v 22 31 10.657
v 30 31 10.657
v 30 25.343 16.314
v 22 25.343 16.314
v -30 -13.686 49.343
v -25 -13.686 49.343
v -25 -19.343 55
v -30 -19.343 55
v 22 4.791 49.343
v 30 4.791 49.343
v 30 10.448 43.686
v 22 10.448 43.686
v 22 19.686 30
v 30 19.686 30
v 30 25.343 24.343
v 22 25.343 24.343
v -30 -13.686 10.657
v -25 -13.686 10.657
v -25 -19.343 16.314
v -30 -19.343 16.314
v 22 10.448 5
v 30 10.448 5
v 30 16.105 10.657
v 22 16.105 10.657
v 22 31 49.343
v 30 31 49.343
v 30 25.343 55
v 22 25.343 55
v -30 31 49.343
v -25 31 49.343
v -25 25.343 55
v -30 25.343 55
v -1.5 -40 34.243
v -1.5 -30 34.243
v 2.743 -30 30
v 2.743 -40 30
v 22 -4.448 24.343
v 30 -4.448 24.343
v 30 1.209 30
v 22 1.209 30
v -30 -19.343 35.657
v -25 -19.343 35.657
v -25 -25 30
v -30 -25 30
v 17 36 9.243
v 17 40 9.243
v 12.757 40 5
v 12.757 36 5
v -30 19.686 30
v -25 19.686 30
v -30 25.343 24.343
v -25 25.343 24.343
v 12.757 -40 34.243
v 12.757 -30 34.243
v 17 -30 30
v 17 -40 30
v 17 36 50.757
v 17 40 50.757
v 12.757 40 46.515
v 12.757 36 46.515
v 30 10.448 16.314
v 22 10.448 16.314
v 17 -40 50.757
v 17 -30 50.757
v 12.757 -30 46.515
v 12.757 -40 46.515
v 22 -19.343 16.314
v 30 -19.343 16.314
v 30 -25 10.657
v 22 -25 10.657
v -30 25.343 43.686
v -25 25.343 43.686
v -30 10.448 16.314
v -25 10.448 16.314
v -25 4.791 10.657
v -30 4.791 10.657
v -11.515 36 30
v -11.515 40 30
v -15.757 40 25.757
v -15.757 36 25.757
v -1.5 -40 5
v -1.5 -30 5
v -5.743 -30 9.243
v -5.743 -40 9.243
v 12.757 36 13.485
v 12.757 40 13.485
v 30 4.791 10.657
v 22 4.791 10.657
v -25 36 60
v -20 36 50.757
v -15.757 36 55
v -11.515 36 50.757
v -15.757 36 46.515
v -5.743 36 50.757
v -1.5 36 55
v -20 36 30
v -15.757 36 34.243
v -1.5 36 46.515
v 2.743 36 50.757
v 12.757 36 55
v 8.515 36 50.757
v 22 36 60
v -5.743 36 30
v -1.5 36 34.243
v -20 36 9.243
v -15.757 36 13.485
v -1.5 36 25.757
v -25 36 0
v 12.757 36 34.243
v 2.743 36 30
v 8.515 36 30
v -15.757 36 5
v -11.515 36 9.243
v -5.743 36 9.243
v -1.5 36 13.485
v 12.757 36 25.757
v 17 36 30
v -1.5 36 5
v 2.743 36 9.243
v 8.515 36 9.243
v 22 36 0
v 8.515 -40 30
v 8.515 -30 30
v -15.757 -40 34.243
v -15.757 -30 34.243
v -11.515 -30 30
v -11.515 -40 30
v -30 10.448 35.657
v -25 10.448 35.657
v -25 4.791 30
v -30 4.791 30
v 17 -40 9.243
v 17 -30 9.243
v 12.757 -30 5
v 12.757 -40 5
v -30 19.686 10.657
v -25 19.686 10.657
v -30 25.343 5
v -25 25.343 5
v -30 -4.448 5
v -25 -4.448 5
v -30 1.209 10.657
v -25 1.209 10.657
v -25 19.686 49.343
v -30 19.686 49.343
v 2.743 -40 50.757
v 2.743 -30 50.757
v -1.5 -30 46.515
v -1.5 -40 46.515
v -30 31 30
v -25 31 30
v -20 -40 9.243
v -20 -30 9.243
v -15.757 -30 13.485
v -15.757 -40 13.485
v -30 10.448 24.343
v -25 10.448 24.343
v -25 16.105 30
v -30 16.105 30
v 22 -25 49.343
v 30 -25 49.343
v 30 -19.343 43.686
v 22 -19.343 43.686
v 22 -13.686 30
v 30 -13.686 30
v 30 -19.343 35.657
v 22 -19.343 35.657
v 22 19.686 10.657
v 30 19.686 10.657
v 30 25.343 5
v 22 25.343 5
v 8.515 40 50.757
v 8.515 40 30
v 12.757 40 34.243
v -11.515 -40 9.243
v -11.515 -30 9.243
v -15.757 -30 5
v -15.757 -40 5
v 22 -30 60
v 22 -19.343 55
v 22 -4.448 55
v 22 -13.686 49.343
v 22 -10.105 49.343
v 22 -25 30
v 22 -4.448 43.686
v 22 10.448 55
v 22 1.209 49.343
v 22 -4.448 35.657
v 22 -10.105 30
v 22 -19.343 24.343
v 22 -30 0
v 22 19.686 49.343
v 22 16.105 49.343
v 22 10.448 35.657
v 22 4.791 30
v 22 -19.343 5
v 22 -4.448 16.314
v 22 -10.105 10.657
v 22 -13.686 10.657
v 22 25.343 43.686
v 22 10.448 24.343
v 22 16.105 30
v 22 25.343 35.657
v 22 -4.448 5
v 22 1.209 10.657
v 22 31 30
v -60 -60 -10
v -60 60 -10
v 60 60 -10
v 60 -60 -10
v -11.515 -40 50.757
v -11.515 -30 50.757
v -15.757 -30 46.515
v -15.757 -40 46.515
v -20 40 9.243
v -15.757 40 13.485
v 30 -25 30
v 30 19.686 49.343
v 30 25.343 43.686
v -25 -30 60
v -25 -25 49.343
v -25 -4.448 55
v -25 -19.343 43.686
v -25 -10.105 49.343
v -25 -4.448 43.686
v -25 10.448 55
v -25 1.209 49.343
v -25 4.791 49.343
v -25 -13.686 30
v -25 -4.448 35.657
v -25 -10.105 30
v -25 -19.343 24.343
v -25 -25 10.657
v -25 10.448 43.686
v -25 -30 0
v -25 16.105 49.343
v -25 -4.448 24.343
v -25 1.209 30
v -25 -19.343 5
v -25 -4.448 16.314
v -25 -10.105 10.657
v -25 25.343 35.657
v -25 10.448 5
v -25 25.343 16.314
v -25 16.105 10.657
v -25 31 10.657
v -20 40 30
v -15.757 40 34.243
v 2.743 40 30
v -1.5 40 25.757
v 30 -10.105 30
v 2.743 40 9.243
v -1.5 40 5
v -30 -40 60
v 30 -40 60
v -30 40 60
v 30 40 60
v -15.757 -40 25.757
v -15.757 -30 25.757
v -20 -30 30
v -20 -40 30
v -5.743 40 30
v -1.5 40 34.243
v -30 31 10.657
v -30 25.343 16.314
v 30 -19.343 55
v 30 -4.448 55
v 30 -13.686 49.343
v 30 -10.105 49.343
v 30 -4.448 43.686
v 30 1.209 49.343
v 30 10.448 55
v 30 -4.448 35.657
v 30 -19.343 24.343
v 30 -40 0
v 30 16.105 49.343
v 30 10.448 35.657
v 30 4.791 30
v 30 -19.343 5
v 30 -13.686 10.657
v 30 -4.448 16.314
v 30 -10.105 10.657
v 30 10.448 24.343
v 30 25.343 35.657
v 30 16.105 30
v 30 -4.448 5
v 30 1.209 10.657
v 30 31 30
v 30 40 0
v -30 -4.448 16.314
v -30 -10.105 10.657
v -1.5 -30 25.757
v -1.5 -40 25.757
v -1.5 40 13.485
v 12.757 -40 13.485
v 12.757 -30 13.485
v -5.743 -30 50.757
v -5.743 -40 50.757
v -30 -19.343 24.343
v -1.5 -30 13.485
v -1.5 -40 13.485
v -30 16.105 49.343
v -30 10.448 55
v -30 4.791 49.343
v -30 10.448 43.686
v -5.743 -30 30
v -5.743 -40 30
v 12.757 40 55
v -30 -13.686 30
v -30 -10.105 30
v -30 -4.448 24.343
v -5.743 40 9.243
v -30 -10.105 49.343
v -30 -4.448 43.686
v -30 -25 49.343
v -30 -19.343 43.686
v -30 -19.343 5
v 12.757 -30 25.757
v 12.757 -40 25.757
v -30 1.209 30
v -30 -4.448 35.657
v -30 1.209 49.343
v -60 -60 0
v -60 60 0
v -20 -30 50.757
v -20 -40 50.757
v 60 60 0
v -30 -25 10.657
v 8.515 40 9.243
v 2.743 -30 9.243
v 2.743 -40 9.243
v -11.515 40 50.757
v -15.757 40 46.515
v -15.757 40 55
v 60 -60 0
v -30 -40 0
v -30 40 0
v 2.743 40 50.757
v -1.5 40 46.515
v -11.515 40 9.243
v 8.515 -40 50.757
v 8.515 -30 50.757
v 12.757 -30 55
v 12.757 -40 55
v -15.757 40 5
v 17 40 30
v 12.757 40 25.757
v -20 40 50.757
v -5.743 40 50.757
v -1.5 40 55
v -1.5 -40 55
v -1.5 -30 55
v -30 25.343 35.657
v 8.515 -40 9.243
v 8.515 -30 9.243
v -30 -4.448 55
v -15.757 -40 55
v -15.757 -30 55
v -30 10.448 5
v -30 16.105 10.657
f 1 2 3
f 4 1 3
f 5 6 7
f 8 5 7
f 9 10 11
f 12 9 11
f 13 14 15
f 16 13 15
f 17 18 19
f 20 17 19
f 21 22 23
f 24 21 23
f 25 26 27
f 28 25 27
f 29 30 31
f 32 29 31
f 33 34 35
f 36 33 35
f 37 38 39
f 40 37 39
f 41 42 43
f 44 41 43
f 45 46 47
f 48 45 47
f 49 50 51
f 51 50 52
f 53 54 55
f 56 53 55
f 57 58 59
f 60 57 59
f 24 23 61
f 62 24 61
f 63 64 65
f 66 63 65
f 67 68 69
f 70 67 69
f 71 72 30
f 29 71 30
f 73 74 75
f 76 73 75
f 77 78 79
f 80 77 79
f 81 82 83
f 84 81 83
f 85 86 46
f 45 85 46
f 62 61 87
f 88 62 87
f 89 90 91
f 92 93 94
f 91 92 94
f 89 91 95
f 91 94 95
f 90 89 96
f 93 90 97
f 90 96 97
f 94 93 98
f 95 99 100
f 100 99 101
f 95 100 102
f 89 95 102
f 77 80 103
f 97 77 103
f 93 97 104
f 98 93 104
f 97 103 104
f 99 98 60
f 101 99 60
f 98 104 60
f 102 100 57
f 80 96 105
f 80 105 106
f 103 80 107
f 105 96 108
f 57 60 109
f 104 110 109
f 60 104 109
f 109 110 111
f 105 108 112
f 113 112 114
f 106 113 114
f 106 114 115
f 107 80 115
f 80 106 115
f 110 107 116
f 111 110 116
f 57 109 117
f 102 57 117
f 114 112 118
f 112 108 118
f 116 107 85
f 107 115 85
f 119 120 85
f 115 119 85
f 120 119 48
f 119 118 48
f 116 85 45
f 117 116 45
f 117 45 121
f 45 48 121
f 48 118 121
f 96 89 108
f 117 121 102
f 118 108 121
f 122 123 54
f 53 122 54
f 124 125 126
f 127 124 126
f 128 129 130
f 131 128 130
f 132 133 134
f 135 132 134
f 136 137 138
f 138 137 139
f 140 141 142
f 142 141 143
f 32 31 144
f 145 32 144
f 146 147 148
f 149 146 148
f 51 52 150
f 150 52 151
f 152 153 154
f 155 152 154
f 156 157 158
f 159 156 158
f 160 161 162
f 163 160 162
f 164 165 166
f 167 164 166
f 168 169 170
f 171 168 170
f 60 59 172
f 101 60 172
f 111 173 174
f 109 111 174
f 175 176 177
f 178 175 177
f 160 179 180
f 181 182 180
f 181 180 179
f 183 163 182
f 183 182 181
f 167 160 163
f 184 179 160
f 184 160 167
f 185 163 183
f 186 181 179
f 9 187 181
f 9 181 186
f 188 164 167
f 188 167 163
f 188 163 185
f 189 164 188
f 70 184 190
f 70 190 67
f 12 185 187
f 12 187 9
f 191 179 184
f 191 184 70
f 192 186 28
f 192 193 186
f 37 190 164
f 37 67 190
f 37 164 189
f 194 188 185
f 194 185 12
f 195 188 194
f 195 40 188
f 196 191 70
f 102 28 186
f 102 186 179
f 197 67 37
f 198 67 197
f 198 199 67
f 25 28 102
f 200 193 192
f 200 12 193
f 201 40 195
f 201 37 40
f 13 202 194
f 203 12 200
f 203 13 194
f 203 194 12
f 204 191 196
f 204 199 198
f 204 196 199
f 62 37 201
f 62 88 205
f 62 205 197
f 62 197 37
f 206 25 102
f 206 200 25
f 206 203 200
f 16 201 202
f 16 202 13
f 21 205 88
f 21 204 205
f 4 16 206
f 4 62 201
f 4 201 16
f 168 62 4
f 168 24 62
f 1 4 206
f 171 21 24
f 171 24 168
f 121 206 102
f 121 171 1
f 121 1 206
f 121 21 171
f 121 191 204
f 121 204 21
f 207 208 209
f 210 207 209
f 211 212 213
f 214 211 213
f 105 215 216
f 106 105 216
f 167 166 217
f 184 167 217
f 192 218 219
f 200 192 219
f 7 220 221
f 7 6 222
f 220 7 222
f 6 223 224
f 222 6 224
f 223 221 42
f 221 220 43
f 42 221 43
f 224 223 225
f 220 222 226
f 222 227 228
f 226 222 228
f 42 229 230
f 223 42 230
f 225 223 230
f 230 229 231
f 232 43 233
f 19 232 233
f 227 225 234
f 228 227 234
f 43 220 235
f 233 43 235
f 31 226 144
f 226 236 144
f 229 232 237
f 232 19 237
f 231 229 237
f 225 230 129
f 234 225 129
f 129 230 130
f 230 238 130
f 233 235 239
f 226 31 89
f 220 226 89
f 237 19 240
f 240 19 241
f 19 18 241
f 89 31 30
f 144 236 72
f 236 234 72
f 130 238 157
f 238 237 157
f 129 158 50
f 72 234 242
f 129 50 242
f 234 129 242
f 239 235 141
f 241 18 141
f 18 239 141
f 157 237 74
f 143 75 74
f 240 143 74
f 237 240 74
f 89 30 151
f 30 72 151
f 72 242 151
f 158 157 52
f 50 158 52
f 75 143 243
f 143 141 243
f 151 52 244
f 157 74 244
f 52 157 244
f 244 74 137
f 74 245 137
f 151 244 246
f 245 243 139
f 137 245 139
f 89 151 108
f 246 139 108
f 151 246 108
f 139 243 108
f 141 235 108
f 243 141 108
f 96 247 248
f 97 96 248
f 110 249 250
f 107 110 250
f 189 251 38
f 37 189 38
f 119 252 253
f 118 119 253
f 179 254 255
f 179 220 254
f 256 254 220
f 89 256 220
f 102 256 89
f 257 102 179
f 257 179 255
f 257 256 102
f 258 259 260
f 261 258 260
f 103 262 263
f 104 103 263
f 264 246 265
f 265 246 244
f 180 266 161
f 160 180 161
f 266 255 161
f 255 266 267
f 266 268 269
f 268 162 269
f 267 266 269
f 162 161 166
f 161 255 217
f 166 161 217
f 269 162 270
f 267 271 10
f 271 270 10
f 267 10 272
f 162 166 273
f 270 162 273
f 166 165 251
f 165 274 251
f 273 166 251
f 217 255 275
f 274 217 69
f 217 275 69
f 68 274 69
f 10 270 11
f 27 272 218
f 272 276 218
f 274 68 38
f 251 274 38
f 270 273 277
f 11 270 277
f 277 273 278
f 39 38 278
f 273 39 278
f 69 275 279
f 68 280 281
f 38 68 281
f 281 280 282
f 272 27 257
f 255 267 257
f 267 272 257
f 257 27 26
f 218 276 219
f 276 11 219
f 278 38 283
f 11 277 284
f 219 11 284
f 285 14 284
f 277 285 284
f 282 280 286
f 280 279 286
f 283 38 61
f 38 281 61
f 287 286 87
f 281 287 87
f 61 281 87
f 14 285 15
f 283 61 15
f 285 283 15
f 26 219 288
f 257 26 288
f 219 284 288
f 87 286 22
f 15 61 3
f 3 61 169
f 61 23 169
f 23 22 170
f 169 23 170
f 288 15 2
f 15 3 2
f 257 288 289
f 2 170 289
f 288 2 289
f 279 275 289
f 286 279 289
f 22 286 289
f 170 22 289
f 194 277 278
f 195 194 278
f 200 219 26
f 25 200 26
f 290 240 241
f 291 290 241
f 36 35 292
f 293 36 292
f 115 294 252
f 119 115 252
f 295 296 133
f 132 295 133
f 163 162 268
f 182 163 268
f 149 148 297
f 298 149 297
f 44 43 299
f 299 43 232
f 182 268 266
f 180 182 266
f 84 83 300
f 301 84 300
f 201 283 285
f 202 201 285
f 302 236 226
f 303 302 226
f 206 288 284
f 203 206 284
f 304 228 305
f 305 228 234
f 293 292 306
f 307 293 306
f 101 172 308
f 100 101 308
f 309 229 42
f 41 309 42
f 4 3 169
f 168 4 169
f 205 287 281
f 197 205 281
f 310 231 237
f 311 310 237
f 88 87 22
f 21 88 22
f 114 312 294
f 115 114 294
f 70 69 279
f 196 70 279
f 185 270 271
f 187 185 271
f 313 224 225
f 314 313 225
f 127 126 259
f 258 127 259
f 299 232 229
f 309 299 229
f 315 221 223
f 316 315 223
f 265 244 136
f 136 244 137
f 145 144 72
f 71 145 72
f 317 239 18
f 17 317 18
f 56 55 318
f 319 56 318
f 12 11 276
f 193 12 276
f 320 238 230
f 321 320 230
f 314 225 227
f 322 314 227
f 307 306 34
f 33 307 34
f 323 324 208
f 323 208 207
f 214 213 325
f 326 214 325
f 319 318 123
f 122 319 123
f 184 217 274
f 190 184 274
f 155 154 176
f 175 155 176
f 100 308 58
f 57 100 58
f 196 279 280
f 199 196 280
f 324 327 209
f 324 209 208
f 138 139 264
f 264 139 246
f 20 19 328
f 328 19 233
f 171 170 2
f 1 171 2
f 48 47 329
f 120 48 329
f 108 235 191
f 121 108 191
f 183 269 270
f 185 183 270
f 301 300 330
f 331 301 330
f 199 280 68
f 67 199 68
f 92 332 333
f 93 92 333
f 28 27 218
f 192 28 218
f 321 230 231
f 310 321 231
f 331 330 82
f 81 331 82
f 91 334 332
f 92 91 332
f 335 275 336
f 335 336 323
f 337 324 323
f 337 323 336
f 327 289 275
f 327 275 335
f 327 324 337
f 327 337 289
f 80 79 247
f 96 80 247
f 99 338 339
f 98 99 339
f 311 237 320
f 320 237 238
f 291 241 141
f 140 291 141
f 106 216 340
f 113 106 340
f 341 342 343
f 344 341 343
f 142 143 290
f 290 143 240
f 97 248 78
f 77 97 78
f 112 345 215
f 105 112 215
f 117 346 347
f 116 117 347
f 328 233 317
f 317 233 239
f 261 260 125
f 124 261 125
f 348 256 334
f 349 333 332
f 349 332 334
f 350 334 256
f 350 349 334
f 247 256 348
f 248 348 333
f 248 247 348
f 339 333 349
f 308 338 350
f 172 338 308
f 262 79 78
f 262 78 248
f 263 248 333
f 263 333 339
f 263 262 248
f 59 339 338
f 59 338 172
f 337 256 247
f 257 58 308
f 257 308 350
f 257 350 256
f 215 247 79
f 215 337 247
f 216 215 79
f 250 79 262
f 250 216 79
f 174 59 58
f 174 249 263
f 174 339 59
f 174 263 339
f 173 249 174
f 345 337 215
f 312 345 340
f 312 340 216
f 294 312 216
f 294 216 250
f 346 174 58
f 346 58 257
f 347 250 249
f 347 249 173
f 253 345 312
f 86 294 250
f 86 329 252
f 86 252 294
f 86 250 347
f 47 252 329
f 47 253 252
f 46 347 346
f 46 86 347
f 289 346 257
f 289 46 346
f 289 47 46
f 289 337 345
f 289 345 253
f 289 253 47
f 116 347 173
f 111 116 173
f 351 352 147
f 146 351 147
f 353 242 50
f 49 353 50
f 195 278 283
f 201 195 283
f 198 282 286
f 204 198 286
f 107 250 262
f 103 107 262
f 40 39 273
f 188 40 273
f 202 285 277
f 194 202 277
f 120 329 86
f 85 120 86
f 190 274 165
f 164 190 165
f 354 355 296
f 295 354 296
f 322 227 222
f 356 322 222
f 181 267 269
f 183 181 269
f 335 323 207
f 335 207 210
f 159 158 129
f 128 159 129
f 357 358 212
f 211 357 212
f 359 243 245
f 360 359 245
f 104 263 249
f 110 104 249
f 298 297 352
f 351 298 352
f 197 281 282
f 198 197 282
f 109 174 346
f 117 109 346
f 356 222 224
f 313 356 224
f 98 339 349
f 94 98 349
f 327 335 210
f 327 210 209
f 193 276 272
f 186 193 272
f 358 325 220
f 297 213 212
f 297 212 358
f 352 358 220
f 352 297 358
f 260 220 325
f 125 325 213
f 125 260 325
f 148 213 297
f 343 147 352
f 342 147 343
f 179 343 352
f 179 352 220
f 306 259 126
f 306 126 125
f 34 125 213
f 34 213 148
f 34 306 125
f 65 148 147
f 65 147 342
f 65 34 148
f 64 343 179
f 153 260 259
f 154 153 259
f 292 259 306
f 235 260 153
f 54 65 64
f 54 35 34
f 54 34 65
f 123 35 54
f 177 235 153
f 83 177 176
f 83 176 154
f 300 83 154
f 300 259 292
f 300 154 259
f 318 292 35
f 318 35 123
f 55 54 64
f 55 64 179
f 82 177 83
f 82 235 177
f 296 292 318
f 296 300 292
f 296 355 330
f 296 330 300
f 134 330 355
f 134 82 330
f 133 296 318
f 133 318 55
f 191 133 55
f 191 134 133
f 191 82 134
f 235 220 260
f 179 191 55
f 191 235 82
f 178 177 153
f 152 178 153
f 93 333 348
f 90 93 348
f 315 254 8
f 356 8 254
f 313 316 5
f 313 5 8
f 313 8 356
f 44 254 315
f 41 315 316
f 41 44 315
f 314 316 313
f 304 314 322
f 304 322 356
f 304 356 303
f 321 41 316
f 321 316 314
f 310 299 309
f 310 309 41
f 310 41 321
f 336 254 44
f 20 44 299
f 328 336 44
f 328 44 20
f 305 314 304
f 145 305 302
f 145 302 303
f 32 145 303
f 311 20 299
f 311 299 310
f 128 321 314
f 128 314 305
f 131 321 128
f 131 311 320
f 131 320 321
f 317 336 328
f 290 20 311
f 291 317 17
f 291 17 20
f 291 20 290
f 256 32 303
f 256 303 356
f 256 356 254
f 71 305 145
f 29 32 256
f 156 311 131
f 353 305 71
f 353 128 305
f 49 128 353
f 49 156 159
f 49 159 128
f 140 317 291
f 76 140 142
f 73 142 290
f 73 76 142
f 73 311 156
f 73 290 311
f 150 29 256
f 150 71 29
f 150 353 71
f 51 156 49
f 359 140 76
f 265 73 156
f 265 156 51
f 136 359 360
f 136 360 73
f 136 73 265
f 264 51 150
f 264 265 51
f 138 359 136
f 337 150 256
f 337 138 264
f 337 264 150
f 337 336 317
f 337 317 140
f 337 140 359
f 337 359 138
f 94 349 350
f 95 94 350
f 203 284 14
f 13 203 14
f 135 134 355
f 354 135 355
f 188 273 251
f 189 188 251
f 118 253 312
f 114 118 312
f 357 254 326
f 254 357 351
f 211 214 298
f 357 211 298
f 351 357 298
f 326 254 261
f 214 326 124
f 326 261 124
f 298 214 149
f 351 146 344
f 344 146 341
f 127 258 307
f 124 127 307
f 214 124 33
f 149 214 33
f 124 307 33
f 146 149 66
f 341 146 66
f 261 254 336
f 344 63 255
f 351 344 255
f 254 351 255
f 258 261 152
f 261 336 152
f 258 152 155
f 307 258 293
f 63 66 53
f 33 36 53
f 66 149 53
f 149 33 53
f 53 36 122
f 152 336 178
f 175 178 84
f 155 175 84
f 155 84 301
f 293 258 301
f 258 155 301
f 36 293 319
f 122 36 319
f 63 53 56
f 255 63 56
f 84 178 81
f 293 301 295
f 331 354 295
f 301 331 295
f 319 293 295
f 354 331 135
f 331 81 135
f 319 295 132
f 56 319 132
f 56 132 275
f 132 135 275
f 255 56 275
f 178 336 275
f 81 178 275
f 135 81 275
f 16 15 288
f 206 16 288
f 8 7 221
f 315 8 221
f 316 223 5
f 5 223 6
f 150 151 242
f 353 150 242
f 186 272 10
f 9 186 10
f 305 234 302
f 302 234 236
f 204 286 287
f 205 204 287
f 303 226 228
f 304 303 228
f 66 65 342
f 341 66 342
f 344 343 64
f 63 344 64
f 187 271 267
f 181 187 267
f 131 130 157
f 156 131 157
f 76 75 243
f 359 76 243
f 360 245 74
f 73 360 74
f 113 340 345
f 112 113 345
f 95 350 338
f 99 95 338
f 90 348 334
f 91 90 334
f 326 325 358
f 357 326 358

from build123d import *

# Parameters (mm, degrees)
F0_W     = 60
F0_H     = 80
F0_W_2   = 47
F0_H_2   = 66
F1_DEPTH = 60
F3_DEPTH = 60.001
F5_DEPTH = 80.001
F7_DEPTH = 10


with BuildPart() as f1:
    # F0 (on Top) → F1 (new body)
    with BuildSketch(Plane.XY):
        Rectangle(F0_W, F0_H)
        with Locations((-1.5, 3)):
            Rectangle(F0_W_2, F0_H_2, mode=Mode.SUBTRACT)
    extrude(amount=F1_DEPTH)

    # F2 (on face) → F3 (cut, through all)
    with BuildSketch(Plane.YZ.offset(30)):
        Polygon((-19.343146, 55), (-25, 49.343146), (-19.343146, 43.686292), (-13.686292, 49.343146), align=None)
        Polygon((-4.447715, 55), (-10.104569, 49.343146), (-4.447715, 43.686292), (1.209139, 49.343146), align=None)
        Polygon((10.447715, 55), (4.790861, 49.343146), (10.447715, 43.686292), (16.104569, 49.343146), align=None)
        Polygon((25.343146, 55), (19.686292, 49.343146), (25.343146, 43.686292), (31, 49.343146), align=None)
        Polygon((-10.104569, 30), (-4.447715, 24.343146), (1.209139, 30), (-4.447715, 35.656854), align=None)
        Polygon((25.343146, 24.343146), (31, 30), (25.343146, 35.656854), (19.686292, 30), align=None)
        Polygon((-19.343146, 35.656854), (-25, 30), (-19.343146, 24.343146), (-13.686292, 30), align=None)
        Polygon((10.447715, 35.656854), (4.790861, 30), (10.447715, 24.343146), (16.104569, 30), align=None)
        Polygon((-10.104569, 10.656854), (-4.447715, 5), (1.209139, 10.656854), (-4.447715, 16.313708), align=None)
        Polygon((25.343146, 5), (31, 10.656854), (25.343146, 16.313708), (19.686292, 10.656854), align=None)
        Polygon((-19.343146, 16.313708), (-25, 10.656854), (-19.343146, 5), (-13.686292, 10.656854), align=None)
        Polygon((10.447715, 16.313708), (4.790861, 10.656854), (10.447715, 5), (16.104569, 10.656854), align=None)
    extrude(amount=-F3_DEPTH, mode=Mode.SUBTRACT)

    # F4 (on face) → F5 (cut, through all)
    with BuildSketch(Plane(origin=(0, 40, 0), x_dir=(-1, 0, 0), z_dir=(0, 1, 0))):
        Polygon((-12.757359, 55), (-17, 50.757359), (-12.757359, 46.514719), (-8.514719, 50.757359), align=None)
        Polygon((-8.514719, 30), (-12.757359, 34.242641), (-17, 30), (-12.757359, 25.757359), align=None)
        Polygon((-8.514719, 9.242641), (-12.757359, 13.485281), (-17, 9.242641), (-12.757359, 5), align=None)
        Polygon((5.742641, 50.757359), (1.5, 55), (-2.742641, 50.757359), (1.5, 46.514719), align=None)
        Polygon((5.742641, 30), (1.5, 34.242641), (-2.742641, 30), (1.5, 25.757359), align=None)
        Polygon((5.742641, 9.242641), (1.5, 13.485281), (-2.742641, 9.242641), (1.5, 5), align=None)
        Polygon((20, 50.757359), (15.757359, 55), (11.514719, 50.757359), (15.757359, 46.514719), align=None)
        Polygon((20, 30), (15.757359, 34.242641), (11.514719, 30), (15.757359, 25.757359), align=None)
        Polygon((20, 9.242641), (15.757359, 13.485281), (11.514719, 9.242641), (15.757359, 5), align=None)
    extrude(amount=-F5_DEPTH, mode=Mode.SUBTRACT)

    # F6 (on Top) → F7 (join)
    with BuildSketch(Plane.XY):
        Polygon((0, 0), (60, -60), (60, 60), align=None)
        Polygon((-60, -60), (60, -60), (0, 0), align=None)
        Polygon((-60, 60), (-60, -60), (0, 0), align=None)
        Polygon((0, 0), (60, 60), (-60, 60), align=None)
    extrude(amount=-F7_DEPTH)


solid = f1.part
